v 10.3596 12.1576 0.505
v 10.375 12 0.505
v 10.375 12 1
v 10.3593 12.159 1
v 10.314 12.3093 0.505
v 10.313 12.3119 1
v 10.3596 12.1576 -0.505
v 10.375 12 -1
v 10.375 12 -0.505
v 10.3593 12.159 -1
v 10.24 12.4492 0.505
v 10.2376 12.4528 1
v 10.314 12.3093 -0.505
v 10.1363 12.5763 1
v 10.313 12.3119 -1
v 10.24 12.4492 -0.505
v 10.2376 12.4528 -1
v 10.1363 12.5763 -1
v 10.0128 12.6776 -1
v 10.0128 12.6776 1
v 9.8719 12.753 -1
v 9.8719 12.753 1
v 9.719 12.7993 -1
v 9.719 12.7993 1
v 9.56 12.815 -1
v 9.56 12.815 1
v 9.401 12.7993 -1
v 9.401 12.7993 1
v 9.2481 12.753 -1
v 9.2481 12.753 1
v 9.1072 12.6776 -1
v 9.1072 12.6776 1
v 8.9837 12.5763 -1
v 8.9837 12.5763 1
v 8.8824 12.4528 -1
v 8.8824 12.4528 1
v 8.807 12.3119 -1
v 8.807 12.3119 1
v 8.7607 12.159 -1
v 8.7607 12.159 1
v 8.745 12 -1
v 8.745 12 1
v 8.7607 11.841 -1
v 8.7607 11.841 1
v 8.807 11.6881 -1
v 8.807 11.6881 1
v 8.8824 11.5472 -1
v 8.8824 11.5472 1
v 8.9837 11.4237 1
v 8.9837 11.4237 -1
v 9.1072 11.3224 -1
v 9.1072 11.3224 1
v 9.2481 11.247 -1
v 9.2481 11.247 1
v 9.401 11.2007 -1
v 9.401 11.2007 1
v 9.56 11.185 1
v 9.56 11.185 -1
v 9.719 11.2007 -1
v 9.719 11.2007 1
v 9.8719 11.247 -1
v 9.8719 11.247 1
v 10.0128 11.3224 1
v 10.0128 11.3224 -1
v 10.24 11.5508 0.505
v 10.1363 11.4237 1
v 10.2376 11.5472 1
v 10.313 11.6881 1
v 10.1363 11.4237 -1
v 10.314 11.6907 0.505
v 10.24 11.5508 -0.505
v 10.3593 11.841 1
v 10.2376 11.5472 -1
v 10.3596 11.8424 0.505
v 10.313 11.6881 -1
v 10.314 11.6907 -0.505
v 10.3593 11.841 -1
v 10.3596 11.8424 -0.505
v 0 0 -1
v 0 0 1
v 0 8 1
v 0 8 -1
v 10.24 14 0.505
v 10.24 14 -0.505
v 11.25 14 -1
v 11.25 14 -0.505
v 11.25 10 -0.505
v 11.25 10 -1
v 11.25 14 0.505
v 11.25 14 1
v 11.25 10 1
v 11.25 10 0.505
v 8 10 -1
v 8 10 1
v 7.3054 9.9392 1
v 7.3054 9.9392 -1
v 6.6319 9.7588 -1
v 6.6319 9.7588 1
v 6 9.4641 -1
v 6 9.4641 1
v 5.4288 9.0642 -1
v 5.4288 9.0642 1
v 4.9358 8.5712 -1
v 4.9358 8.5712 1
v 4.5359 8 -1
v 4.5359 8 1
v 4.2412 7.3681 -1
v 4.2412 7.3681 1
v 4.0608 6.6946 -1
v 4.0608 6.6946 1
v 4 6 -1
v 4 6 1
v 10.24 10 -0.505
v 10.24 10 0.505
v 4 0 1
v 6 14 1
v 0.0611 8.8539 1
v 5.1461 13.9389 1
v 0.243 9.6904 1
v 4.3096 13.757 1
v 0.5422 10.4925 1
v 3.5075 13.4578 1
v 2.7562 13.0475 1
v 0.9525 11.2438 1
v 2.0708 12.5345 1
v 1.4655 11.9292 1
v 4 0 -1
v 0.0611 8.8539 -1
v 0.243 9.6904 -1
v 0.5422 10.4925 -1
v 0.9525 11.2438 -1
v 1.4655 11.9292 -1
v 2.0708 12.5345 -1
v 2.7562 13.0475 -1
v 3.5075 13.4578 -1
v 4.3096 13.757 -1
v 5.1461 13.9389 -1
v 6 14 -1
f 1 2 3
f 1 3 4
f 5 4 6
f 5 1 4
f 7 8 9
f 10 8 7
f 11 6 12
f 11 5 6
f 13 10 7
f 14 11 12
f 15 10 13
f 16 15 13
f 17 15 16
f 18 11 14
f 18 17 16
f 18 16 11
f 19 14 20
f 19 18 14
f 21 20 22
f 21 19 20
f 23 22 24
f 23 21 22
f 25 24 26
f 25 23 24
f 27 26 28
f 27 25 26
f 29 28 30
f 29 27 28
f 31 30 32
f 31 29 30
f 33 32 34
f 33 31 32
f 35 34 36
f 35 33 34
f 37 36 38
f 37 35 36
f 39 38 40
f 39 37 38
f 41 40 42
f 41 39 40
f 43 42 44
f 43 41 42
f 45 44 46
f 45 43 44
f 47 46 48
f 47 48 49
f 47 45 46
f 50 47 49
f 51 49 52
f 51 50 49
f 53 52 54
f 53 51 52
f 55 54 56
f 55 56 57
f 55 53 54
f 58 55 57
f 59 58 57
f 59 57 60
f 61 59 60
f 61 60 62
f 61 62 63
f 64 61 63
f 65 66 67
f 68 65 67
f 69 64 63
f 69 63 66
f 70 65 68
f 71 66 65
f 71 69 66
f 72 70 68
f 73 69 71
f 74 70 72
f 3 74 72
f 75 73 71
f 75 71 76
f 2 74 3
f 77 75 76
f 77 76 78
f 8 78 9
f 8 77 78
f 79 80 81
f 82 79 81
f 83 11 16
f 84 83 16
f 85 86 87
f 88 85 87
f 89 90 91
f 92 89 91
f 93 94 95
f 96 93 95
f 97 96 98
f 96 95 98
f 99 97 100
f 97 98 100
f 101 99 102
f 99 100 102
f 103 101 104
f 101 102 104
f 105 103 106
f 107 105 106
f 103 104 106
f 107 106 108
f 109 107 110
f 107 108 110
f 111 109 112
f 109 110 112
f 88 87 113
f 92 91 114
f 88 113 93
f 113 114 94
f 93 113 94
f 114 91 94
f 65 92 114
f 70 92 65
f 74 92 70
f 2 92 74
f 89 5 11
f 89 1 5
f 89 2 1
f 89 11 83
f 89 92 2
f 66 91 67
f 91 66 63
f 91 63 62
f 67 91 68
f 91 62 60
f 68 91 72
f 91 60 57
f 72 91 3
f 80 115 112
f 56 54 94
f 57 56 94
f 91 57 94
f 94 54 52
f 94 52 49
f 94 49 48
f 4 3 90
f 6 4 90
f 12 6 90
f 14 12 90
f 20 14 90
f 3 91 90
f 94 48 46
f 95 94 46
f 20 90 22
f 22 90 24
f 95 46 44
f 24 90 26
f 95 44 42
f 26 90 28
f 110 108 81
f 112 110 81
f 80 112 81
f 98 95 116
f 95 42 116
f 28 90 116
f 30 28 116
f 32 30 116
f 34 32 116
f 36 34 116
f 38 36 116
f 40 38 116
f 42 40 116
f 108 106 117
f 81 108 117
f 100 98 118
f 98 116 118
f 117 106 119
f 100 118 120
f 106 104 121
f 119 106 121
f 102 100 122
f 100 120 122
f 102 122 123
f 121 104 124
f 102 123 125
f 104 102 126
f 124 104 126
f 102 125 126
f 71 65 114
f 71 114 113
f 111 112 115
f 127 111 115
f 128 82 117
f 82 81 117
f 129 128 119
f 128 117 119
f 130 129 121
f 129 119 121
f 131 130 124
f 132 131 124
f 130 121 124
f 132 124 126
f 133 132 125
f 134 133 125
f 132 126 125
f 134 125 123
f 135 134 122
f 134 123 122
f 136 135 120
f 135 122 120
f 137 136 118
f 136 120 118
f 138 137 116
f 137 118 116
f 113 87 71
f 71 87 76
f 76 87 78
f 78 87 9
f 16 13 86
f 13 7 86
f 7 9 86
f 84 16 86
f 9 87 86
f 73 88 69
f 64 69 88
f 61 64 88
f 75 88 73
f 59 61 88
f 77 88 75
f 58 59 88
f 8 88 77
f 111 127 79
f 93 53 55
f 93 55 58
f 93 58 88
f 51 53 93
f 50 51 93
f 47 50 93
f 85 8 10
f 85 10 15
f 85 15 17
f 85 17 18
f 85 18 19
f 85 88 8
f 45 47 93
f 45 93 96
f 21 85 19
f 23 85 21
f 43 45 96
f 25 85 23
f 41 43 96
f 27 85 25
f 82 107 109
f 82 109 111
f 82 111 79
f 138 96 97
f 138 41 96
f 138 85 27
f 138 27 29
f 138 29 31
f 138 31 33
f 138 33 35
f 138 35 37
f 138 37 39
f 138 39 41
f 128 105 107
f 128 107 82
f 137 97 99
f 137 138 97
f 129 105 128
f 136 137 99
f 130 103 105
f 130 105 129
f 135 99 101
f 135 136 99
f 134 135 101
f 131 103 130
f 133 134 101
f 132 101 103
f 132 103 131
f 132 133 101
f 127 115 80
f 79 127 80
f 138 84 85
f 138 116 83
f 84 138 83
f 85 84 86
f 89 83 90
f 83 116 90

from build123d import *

# Parameters (mm, degrees)
SKETCH1_R           = 0.815
BOSS_EXTRUDE1_DEPTH = 1
SKETCH2_W           = 1.01
SKETCH2_H           = 4
CUT_EXTRUDE1_DEPTH  = 1.01


with BuildPart() as part:
    # Sketch1 → Boss-Extrude1 (new, symmetric)
    with BuildSketch(Plane.XY):
        with BuildLine():
            Line((0, 0), (0, 8))
            ThreePointArc((0, 8), (1.757359313, 12.242640687), (6, 14))
            Line((6, 14), (11.25, 14))
            Line((11.25, 14), (11.25, 10))
            Line((11.25, 10), (8, 10))
            ThreePointArc((8, 10), (5.171572875, 8.828427125), (4, 6))
            Line((4, 6), (4, 0))
            Line((4, 0), (0, 0))
        make_face()
        with Locations((9.56, 12)):
            Circle(SKETCH1_R, mode=Mode.SUBTRACT)
    extrude(amount=BOSS_EXTRUDE1_DEPTH, both=True)

    # Sketch2 → Cut-Extrude1 (cut)
    with BuildSketch(Plane(origin=(11.25, 0, 0), x_dir=(0, 0, -1), z_dir=(1, 0, 0))):
        with Locations((0, 12)):
            Rectangle(SKETCH2_W, SKETCH2_H)
    extrude(amount=-CUT_EXTRUDE1_DEPTH, mode=Mode.SUBTRACT)


solid = part.part
